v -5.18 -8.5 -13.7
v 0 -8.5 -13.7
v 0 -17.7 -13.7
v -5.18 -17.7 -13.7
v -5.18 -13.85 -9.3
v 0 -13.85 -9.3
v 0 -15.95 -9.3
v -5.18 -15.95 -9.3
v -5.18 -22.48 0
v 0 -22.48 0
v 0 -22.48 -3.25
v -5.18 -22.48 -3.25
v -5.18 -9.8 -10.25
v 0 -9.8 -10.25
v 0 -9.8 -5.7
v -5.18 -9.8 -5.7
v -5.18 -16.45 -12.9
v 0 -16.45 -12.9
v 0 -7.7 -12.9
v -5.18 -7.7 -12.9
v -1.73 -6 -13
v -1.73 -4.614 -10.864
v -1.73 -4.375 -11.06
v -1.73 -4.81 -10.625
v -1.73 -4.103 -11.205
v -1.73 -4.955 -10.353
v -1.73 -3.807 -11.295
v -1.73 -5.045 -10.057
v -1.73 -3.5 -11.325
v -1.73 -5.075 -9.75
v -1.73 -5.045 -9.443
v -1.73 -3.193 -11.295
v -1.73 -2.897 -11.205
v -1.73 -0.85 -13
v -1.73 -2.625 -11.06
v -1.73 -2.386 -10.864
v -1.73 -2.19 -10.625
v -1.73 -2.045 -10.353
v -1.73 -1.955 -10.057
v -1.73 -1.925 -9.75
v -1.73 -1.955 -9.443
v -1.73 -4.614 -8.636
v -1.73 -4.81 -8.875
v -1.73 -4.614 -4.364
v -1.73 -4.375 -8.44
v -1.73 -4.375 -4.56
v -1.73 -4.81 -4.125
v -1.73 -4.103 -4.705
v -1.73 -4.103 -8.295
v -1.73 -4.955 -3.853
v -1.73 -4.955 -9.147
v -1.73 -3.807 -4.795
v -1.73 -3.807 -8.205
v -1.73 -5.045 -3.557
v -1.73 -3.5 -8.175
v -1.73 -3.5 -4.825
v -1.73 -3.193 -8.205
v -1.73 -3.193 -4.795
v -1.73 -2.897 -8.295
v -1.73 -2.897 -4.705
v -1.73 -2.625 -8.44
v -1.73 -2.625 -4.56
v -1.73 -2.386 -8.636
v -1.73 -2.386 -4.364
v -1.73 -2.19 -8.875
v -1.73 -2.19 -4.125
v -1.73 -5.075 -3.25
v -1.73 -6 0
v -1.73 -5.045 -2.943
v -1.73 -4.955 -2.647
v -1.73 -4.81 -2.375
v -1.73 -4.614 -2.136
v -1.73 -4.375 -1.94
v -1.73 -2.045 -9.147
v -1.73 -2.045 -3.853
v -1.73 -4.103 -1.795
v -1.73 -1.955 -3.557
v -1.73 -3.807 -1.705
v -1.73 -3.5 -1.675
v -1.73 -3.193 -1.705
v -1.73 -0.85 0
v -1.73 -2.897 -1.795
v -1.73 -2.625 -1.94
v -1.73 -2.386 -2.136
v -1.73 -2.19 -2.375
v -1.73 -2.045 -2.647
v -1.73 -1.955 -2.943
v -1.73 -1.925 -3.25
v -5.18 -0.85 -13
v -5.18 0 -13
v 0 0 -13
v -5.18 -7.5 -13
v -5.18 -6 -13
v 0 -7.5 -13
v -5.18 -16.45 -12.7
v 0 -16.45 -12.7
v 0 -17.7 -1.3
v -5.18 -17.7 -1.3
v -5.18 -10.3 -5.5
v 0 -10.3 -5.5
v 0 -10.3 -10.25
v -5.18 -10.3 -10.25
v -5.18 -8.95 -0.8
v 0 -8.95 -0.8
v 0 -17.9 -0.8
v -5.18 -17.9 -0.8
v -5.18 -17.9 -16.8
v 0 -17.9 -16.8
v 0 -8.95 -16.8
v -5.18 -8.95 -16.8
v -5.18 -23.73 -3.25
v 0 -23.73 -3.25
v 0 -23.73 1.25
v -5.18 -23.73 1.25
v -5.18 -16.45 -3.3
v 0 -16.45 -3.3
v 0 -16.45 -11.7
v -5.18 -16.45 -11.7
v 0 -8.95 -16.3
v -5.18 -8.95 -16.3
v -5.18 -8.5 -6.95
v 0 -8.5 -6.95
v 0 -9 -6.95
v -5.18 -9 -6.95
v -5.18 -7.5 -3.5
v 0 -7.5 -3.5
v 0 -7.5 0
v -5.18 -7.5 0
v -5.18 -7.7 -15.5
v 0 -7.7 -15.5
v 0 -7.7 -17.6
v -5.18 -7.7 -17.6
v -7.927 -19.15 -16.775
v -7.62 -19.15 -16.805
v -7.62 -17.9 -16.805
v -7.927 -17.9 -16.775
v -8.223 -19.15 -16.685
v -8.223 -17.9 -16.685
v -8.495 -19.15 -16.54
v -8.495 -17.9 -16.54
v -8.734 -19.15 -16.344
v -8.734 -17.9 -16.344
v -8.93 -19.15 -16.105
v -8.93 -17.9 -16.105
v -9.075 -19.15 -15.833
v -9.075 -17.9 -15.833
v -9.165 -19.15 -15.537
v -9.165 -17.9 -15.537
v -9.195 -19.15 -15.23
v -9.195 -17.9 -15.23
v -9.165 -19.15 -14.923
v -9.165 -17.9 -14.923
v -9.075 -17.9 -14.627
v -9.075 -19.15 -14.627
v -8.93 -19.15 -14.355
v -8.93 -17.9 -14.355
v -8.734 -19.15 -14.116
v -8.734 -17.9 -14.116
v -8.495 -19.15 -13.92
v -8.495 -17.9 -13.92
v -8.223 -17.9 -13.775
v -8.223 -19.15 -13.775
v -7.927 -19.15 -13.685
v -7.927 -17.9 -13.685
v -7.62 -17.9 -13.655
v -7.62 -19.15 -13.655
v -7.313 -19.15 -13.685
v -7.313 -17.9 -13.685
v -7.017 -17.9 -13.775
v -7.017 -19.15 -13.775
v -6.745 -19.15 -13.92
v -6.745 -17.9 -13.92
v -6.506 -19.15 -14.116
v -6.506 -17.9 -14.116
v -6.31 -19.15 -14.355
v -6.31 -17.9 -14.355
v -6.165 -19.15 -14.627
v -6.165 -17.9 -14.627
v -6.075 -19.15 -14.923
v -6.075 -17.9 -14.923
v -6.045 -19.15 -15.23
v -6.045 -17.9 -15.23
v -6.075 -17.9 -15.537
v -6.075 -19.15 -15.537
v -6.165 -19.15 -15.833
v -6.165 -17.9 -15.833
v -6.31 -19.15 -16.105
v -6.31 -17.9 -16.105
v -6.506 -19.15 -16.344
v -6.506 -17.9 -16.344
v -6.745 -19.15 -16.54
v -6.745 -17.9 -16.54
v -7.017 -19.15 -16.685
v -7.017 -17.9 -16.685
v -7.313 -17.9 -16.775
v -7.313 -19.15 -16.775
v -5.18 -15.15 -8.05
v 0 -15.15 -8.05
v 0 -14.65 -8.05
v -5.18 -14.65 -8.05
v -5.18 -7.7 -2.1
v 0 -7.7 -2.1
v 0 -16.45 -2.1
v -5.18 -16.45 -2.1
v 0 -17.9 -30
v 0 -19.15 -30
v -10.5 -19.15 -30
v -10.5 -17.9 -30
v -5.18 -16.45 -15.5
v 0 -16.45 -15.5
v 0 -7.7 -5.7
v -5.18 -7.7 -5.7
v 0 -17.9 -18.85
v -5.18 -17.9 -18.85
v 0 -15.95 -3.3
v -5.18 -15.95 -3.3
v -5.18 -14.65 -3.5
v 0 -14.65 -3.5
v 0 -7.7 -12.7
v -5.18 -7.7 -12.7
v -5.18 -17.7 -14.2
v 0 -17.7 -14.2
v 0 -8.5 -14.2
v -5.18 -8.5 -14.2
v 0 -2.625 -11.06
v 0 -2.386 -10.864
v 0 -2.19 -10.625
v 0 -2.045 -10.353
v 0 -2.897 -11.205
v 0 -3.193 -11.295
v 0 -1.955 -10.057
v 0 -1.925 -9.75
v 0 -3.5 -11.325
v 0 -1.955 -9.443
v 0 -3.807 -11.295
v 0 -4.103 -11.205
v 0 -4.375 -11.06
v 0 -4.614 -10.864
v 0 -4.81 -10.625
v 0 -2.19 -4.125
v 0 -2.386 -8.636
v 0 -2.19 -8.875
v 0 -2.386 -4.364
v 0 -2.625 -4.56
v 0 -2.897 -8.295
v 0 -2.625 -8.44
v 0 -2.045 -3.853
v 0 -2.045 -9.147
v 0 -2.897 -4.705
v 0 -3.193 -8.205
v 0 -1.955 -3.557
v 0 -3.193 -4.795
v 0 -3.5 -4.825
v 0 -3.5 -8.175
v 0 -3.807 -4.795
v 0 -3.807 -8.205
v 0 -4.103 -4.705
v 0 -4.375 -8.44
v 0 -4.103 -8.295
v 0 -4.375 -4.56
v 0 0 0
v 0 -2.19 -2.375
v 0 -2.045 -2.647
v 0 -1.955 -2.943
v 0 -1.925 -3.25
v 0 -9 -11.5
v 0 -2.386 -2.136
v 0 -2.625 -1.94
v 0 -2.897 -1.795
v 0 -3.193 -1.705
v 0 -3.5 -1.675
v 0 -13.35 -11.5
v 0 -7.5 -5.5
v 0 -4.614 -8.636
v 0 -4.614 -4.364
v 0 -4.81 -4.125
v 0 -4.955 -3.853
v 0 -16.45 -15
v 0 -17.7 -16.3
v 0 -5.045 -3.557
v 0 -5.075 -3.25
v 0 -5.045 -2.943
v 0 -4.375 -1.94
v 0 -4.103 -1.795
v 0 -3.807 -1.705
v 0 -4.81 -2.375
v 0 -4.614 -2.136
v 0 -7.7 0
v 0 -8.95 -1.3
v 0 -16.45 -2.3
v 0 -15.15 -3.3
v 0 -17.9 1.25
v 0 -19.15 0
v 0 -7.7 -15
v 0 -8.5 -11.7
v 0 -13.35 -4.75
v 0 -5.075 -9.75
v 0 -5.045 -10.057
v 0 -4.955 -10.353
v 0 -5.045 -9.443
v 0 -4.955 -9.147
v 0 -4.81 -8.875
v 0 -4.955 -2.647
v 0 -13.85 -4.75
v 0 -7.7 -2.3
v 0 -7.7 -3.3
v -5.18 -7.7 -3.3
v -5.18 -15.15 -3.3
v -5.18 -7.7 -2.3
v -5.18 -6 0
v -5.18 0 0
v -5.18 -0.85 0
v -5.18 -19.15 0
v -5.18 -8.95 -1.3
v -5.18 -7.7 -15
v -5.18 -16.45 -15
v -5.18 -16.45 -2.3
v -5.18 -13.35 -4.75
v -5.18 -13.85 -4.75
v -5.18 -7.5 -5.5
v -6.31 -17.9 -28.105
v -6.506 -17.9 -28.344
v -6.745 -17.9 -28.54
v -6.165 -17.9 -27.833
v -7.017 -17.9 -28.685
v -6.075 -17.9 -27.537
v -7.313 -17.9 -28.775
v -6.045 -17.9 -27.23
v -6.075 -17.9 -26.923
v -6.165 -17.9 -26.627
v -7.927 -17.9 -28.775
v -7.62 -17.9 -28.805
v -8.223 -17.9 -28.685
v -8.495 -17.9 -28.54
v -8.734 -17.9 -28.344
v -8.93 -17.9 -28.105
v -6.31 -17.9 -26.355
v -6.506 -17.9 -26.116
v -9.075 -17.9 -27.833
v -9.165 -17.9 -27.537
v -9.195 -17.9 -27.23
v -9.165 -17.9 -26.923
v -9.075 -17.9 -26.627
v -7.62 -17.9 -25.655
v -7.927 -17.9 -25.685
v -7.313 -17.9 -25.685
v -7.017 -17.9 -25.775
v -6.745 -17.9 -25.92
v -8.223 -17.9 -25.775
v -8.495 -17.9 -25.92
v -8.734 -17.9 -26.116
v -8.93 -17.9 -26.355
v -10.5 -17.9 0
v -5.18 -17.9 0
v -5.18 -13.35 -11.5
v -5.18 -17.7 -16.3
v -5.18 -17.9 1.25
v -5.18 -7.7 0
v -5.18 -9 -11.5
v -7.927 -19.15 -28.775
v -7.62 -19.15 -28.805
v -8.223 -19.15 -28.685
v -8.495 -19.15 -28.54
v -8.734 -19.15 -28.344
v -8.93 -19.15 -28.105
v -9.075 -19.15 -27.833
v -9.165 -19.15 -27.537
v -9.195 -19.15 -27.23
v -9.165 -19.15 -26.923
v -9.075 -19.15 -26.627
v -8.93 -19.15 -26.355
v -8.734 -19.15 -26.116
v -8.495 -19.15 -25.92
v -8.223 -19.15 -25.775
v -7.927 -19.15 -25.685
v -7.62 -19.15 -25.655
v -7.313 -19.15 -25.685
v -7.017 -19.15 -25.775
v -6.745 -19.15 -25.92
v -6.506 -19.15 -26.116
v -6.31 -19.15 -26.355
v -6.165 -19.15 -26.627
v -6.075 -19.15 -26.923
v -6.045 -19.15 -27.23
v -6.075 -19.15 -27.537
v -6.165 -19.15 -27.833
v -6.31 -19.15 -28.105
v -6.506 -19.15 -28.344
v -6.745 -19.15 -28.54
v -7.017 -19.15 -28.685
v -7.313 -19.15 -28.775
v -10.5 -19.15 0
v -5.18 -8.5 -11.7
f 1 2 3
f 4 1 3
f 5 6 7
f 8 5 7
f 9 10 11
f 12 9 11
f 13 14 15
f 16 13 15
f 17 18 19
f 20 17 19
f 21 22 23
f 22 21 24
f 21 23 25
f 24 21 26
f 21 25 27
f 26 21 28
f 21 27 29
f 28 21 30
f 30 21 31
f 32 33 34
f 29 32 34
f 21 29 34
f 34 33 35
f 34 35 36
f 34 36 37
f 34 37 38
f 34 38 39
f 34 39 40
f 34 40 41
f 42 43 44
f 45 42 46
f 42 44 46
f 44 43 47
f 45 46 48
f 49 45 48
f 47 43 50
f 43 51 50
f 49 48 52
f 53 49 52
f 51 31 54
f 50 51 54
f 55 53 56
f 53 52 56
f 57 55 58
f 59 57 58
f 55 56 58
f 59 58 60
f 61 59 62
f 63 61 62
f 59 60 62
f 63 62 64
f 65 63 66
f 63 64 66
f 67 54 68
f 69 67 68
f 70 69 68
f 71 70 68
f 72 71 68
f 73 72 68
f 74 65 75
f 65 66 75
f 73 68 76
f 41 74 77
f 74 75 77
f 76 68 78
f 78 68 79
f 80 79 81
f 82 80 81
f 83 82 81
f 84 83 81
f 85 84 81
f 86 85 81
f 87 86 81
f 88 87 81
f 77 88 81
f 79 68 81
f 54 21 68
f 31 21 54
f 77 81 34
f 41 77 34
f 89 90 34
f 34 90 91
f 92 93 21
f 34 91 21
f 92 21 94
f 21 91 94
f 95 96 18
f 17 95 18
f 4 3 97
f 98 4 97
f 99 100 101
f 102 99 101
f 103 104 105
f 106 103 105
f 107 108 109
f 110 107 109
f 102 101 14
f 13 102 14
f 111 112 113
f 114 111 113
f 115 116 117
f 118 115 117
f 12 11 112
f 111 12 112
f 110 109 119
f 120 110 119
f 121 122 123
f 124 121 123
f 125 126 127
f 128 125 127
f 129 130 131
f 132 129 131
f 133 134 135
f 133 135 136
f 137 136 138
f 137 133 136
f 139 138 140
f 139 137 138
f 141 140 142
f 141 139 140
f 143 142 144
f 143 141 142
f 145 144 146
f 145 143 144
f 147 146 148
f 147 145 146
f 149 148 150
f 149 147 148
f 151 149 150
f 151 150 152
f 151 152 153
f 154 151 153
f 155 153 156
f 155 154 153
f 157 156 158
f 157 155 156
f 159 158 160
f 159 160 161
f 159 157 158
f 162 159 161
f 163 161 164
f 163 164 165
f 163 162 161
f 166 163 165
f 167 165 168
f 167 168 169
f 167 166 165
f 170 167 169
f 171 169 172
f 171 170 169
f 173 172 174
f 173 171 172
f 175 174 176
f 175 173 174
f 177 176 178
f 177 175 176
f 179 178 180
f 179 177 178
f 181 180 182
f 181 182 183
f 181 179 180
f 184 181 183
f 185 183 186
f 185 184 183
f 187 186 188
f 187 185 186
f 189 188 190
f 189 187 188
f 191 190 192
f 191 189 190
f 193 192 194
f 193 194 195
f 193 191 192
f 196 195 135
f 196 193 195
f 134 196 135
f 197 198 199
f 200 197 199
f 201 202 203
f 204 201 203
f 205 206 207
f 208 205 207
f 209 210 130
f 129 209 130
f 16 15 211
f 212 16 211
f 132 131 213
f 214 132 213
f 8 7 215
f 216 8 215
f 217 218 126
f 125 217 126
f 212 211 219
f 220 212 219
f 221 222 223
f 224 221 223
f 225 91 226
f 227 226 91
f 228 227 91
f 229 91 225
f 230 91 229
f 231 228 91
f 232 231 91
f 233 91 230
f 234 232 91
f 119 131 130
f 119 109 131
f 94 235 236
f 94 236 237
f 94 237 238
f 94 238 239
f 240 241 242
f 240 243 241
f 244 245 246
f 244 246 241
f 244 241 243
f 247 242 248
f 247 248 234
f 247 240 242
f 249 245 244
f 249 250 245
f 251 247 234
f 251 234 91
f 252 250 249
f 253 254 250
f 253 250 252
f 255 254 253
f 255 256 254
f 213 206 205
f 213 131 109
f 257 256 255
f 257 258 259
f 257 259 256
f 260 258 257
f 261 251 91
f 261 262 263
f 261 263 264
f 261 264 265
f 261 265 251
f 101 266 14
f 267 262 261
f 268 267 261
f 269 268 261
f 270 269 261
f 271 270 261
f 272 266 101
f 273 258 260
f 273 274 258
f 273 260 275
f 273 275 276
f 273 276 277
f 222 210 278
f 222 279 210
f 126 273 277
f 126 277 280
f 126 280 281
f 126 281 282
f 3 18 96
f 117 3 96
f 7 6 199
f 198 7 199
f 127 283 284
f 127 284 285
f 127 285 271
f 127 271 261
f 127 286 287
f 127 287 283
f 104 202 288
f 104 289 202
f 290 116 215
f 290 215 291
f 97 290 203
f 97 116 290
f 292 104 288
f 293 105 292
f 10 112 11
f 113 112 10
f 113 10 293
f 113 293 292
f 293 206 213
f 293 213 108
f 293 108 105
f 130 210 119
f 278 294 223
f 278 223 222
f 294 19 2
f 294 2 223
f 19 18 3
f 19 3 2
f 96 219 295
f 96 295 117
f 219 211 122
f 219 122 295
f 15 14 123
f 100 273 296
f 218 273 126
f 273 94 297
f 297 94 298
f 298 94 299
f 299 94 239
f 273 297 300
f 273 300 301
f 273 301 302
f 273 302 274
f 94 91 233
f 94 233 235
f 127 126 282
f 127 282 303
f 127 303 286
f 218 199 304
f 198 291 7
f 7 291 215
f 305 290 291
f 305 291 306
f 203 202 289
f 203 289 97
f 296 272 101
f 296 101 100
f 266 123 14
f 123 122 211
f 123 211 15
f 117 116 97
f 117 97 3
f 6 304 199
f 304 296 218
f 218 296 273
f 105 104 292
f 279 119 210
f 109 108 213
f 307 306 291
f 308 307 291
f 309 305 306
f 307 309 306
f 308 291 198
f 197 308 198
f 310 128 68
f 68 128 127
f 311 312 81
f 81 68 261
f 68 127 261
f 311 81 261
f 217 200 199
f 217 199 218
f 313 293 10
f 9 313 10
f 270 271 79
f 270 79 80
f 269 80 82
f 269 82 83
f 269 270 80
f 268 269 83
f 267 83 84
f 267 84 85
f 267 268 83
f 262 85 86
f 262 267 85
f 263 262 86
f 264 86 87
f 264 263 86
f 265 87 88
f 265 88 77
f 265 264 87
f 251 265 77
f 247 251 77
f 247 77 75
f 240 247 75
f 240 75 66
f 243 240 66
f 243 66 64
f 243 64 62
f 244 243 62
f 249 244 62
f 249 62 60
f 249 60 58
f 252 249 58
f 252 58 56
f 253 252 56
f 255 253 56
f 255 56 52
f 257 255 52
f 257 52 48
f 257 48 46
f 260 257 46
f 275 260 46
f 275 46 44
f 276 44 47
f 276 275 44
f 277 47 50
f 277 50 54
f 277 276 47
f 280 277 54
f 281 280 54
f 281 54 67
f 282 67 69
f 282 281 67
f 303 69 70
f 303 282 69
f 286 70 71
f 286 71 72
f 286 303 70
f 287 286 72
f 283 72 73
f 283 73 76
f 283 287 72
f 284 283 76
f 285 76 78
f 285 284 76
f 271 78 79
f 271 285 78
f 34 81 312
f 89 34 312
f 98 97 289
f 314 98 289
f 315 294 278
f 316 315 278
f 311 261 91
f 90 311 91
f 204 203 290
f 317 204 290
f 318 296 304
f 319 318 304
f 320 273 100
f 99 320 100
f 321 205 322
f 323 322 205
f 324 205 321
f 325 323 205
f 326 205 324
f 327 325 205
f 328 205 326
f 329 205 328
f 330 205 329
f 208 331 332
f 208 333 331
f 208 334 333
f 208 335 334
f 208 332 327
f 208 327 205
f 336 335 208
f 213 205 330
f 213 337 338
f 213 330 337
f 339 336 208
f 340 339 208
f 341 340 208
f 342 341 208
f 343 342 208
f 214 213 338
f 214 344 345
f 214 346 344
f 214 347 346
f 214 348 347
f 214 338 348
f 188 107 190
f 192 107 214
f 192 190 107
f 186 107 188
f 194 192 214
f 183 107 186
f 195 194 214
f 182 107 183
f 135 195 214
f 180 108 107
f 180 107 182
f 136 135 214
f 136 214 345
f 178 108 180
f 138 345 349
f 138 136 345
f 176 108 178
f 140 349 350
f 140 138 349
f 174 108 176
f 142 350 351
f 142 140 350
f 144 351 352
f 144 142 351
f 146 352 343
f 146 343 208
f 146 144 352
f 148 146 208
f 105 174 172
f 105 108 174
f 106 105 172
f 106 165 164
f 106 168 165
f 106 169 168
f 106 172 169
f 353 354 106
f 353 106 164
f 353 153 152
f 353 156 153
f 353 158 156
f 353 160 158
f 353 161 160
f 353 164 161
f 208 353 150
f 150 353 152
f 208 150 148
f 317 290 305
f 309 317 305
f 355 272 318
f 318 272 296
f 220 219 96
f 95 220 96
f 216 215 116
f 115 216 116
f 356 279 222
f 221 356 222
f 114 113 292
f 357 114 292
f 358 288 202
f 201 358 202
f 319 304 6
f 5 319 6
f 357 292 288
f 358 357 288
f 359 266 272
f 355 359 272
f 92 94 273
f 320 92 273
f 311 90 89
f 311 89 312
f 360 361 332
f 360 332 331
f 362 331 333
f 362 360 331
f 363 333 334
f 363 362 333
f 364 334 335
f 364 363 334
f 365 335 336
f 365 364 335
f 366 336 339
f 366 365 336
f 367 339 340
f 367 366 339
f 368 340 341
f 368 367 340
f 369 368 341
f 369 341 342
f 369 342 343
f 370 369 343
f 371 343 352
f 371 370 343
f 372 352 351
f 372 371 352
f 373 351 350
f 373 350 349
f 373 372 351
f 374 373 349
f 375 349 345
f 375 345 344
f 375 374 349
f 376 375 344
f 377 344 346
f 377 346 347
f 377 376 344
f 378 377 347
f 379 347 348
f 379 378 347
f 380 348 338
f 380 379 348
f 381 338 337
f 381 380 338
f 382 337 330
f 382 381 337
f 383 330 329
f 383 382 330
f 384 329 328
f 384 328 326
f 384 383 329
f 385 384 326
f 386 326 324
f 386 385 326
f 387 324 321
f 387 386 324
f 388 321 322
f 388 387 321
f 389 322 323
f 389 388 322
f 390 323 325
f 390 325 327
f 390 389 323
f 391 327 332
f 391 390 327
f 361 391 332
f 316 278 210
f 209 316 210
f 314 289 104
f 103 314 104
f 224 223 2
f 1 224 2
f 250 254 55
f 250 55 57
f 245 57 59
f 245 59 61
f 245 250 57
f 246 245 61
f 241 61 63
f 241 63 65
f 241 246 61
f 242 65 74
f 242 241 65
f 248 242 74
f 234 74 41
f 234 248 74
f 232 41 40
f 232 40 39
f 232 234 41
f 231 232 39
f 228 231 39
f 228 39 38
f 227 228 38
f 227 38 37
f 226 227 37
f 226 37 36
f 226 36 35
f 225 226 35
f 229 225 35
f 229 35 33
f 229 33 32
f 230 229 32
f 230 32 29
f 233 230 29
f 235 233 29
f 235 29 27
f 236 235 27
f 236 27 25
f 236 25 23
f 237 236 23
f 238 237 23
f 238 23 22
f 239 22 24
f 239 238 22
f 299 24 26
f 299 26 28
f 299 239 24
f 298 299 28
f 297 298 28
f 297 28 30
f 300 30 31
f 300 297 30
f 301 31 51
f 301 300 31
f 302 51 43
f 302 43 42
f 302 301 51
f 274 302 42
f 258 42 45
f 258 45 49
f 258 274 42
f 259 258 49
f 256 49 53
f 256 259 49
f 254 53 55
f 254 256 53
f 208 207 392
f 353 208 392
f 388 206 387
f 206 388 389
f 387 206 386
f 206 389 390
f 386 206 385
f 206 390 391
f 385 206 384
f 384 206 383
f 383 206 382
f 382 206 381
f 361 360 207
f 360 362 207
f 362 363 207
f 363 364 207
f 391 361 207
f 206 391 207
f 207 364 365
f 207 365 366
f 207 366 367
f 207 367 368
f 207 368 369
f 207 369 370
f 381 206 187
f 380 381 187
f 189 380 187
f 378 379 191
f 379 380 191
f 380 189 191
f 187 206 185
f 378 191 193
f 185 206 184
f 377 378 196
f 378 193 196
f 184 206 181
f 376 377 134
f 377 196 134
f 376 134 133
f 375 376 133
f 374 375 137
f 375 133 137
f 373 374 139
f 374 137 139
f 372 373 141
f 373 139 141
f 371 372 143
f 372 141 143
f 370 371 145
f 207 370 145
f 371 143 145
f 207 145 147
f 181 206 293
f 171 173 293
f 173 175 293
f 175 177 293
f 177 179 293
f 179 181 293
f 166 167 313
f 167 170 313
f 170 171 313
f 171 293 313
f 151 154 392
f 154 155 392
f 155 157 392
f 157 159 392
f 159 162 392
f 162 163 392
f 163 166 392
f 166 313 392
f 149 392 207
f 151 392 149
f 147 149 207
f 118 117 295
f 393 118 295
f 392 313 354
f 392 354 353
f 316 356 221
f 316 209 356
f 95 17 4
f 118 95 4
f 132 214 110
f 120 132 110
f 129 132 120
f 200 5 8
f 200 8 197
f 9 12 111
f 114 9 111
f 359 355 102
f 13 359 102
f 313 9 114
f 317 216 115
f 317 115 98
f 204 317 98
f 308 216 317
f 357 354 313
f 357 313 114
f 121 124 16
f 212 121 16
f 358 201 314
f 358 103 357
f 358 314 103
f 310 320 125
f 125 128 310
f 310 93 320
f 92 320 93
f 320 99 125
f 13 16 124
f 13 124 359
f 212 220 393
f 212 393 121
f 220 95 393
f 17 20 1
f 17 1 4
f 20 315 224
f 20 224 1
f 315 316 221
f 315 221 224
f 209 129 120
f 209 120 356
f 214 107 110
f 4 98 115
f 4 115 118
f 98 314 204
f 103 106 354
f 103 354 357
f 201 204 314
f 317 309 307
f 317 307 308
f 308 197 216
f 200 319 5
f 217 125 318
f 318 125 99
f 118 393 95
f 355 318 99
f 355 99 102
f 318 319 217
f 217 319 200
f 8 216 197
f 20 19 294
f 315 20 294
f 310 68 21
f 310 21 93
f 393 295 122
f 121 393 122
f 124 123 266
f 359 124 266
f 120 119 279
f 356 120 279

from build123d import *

# Parameters (mm, degrees)
BOSS_EXTRUDE1_DEPTH = 5.18
CUT_EXTRUDE1_REACH  = 32.745
SKETCH2_W           = 3.45
SKETCH2_H           = 5.15
SKETCH3_W           = 10.5
SKETCH3_H           = 30
SKETCH3_R           = 1.575
BOSS_EXTRUDE2_DEPTH = 1.25
CUT_EXTRUDE3_REACH  = 41.666
SKETCH7_R           = 1.575


with BuildPart() as part:
    # Sketch1 → Boss-Extrude1 (new body)
    with BuildSketch(Plane(origin=(0, 0, 0), x_dir=(0, 0, -1), z_dir=(1, 0, 0))):
        Polygon((0, 0), (13, 0), (13, -7.5), (5.5, -7.5), (5.5, -10.3), (10.25, -10.3), (10.25, -9.8), (5.7, -9.8), (5.7, -7.7), (12.7, -7.7), (12.7, -16.45), (12.9, -16.45), (12.9, -7.7), (15, -7.7), (15, -16.45), (15.5, -16.45), (15.5, -7.7), (17.6, -7.7), (18.85, -17.9), (18.85, -19.15), (0, -19.15), (0, -22.48), (3.25, -22.48), (3.25, -23.73), (-1.25, -23.73), (-1.25, -17.9), (0, -7.7), (2.1, -7.7), (2.1, -16.45), (2.3, -16.45), (2.3, -7.7), (3.3, -7.7), (3.3, -15.15), (8.05, -15.15), (8.05, -14.65), (3.5, -14.65), (3.5, -7.5), (0, -7.5), align=None)
        Polygon((13.7, -8.5), (13.7, -17.7), (1.3, -17.7), (1.3, -8.95), (0.8, -8.95), (0.8, -17.9), (16.8, -17.9), (16.8, -8.95), (16.3, -8.95), (16.3, -17.7), (14.2, -17.7), (14.2, -8.5), align=None, mode=Mode.SUBTRACT)
        Polygon((3.3, -16.45), (11.7, -16.45), (11.7, -8.5), (6.95, -8.5), (6.95, -9), (11.5, -9), (11.5, -13.35), (4.75, -13.35), (4.75, -13.85), (9.3, -13.85), (9.3, -15.95), (3.3, -15.95), align=None, mode=Mode.SUBTRACT)
    extrude(amount=BOSS_EXTRUDE1_DEPTH)

    # Sketch2 → Cut-Extrude1 (cut, up to next)
    with BuildSketch(Plane.XY, mode=Mode.PRIVATE) as cut_extrude1_sk1:
        with Locations((3.455, -3.425)):
            Rectangle(SKETCH2_W, SKETCH2_H)
    cut_extrude1_tool1 = extrude(cut_extrude1_sk1.sketch, amount=-CUT_EXTRUDE1_REACH, mode=Mode.PRIVATE) & part.part
    add(cut_extrude1_tool1.solids().sort_by_distance((3.455, -3.425, 0))[0], mode=Mode.SUBTRACT)

    # Sketch3 → Boss-Extrude2 (add)
    with BuildSketch(Plane.XZ.offset(19.15)):
        with Locations((5.25, -15)):
            Rectangle(SKETCH3_W, SKETCH3_H)
        with Locations(Location((7.62, -15.23, 0), (0, 0, 270))):
            Circle(SKETCH3_R, mode=Mode.SUBTRACT)
        with Locations(Location((7.62, -27.23, 0), (0, 0, 270))):
            Circle(SKETCH3_R, mode=Mode.SUBTRACT)
    extrude(amount=-BOSS_EXTRUDE2_DEPTH)

    # Sketch7 → Cut-Extrude3 (cut, up to next)
    with BuildSketch(Plane.ZY, mode=Mode.PRIVATE) as cut_extrude3_sk1:
        with Locations((-3.25, -3.5)):
            Circle(SKETCH7_R)
    cut_extrude3_tool1 = extrude(cut_extrude3_sk1.sketch, amount=-CUT_EXTRUDE3_REACH, mode=Mode.PRIVATE) & part.part
    # Sketch7 → Cut-Extrude3 (cut, up to next)
    with BuildSketch(Plane.ZY, mode=Mode.PRIVATE) as cut_extrude3_sk2:
        with Locations((-9.75, -3.5)):
            Circle(SKETCH7_R)
    cut_extrude3_tool2 = extrude(cut_extrude3_sk2.sketch, amount=-CUT_EXTRUDE3_REACH, mode=Mode.PRIVATE) & part.part
    add(cut_extrude3_tool1.solids().sort_by_distance((0, -3.5, -3.25))[0], mode=Mode.SUBTRACT)
    add(cut_extrude3_tool2.solids().sort_by_distance((0, -3.5, -9.75))[0], mode=Mode.SUBTRACT)


with BuildPart() as body_2:
    # Mirror3: mirrored copy
    add(part.part.mirror(Plane(origin=(0, 0, 0), x_dir=(0, 0, 1), z_dir=(1, 0, 0))))


solid = body_2.part
